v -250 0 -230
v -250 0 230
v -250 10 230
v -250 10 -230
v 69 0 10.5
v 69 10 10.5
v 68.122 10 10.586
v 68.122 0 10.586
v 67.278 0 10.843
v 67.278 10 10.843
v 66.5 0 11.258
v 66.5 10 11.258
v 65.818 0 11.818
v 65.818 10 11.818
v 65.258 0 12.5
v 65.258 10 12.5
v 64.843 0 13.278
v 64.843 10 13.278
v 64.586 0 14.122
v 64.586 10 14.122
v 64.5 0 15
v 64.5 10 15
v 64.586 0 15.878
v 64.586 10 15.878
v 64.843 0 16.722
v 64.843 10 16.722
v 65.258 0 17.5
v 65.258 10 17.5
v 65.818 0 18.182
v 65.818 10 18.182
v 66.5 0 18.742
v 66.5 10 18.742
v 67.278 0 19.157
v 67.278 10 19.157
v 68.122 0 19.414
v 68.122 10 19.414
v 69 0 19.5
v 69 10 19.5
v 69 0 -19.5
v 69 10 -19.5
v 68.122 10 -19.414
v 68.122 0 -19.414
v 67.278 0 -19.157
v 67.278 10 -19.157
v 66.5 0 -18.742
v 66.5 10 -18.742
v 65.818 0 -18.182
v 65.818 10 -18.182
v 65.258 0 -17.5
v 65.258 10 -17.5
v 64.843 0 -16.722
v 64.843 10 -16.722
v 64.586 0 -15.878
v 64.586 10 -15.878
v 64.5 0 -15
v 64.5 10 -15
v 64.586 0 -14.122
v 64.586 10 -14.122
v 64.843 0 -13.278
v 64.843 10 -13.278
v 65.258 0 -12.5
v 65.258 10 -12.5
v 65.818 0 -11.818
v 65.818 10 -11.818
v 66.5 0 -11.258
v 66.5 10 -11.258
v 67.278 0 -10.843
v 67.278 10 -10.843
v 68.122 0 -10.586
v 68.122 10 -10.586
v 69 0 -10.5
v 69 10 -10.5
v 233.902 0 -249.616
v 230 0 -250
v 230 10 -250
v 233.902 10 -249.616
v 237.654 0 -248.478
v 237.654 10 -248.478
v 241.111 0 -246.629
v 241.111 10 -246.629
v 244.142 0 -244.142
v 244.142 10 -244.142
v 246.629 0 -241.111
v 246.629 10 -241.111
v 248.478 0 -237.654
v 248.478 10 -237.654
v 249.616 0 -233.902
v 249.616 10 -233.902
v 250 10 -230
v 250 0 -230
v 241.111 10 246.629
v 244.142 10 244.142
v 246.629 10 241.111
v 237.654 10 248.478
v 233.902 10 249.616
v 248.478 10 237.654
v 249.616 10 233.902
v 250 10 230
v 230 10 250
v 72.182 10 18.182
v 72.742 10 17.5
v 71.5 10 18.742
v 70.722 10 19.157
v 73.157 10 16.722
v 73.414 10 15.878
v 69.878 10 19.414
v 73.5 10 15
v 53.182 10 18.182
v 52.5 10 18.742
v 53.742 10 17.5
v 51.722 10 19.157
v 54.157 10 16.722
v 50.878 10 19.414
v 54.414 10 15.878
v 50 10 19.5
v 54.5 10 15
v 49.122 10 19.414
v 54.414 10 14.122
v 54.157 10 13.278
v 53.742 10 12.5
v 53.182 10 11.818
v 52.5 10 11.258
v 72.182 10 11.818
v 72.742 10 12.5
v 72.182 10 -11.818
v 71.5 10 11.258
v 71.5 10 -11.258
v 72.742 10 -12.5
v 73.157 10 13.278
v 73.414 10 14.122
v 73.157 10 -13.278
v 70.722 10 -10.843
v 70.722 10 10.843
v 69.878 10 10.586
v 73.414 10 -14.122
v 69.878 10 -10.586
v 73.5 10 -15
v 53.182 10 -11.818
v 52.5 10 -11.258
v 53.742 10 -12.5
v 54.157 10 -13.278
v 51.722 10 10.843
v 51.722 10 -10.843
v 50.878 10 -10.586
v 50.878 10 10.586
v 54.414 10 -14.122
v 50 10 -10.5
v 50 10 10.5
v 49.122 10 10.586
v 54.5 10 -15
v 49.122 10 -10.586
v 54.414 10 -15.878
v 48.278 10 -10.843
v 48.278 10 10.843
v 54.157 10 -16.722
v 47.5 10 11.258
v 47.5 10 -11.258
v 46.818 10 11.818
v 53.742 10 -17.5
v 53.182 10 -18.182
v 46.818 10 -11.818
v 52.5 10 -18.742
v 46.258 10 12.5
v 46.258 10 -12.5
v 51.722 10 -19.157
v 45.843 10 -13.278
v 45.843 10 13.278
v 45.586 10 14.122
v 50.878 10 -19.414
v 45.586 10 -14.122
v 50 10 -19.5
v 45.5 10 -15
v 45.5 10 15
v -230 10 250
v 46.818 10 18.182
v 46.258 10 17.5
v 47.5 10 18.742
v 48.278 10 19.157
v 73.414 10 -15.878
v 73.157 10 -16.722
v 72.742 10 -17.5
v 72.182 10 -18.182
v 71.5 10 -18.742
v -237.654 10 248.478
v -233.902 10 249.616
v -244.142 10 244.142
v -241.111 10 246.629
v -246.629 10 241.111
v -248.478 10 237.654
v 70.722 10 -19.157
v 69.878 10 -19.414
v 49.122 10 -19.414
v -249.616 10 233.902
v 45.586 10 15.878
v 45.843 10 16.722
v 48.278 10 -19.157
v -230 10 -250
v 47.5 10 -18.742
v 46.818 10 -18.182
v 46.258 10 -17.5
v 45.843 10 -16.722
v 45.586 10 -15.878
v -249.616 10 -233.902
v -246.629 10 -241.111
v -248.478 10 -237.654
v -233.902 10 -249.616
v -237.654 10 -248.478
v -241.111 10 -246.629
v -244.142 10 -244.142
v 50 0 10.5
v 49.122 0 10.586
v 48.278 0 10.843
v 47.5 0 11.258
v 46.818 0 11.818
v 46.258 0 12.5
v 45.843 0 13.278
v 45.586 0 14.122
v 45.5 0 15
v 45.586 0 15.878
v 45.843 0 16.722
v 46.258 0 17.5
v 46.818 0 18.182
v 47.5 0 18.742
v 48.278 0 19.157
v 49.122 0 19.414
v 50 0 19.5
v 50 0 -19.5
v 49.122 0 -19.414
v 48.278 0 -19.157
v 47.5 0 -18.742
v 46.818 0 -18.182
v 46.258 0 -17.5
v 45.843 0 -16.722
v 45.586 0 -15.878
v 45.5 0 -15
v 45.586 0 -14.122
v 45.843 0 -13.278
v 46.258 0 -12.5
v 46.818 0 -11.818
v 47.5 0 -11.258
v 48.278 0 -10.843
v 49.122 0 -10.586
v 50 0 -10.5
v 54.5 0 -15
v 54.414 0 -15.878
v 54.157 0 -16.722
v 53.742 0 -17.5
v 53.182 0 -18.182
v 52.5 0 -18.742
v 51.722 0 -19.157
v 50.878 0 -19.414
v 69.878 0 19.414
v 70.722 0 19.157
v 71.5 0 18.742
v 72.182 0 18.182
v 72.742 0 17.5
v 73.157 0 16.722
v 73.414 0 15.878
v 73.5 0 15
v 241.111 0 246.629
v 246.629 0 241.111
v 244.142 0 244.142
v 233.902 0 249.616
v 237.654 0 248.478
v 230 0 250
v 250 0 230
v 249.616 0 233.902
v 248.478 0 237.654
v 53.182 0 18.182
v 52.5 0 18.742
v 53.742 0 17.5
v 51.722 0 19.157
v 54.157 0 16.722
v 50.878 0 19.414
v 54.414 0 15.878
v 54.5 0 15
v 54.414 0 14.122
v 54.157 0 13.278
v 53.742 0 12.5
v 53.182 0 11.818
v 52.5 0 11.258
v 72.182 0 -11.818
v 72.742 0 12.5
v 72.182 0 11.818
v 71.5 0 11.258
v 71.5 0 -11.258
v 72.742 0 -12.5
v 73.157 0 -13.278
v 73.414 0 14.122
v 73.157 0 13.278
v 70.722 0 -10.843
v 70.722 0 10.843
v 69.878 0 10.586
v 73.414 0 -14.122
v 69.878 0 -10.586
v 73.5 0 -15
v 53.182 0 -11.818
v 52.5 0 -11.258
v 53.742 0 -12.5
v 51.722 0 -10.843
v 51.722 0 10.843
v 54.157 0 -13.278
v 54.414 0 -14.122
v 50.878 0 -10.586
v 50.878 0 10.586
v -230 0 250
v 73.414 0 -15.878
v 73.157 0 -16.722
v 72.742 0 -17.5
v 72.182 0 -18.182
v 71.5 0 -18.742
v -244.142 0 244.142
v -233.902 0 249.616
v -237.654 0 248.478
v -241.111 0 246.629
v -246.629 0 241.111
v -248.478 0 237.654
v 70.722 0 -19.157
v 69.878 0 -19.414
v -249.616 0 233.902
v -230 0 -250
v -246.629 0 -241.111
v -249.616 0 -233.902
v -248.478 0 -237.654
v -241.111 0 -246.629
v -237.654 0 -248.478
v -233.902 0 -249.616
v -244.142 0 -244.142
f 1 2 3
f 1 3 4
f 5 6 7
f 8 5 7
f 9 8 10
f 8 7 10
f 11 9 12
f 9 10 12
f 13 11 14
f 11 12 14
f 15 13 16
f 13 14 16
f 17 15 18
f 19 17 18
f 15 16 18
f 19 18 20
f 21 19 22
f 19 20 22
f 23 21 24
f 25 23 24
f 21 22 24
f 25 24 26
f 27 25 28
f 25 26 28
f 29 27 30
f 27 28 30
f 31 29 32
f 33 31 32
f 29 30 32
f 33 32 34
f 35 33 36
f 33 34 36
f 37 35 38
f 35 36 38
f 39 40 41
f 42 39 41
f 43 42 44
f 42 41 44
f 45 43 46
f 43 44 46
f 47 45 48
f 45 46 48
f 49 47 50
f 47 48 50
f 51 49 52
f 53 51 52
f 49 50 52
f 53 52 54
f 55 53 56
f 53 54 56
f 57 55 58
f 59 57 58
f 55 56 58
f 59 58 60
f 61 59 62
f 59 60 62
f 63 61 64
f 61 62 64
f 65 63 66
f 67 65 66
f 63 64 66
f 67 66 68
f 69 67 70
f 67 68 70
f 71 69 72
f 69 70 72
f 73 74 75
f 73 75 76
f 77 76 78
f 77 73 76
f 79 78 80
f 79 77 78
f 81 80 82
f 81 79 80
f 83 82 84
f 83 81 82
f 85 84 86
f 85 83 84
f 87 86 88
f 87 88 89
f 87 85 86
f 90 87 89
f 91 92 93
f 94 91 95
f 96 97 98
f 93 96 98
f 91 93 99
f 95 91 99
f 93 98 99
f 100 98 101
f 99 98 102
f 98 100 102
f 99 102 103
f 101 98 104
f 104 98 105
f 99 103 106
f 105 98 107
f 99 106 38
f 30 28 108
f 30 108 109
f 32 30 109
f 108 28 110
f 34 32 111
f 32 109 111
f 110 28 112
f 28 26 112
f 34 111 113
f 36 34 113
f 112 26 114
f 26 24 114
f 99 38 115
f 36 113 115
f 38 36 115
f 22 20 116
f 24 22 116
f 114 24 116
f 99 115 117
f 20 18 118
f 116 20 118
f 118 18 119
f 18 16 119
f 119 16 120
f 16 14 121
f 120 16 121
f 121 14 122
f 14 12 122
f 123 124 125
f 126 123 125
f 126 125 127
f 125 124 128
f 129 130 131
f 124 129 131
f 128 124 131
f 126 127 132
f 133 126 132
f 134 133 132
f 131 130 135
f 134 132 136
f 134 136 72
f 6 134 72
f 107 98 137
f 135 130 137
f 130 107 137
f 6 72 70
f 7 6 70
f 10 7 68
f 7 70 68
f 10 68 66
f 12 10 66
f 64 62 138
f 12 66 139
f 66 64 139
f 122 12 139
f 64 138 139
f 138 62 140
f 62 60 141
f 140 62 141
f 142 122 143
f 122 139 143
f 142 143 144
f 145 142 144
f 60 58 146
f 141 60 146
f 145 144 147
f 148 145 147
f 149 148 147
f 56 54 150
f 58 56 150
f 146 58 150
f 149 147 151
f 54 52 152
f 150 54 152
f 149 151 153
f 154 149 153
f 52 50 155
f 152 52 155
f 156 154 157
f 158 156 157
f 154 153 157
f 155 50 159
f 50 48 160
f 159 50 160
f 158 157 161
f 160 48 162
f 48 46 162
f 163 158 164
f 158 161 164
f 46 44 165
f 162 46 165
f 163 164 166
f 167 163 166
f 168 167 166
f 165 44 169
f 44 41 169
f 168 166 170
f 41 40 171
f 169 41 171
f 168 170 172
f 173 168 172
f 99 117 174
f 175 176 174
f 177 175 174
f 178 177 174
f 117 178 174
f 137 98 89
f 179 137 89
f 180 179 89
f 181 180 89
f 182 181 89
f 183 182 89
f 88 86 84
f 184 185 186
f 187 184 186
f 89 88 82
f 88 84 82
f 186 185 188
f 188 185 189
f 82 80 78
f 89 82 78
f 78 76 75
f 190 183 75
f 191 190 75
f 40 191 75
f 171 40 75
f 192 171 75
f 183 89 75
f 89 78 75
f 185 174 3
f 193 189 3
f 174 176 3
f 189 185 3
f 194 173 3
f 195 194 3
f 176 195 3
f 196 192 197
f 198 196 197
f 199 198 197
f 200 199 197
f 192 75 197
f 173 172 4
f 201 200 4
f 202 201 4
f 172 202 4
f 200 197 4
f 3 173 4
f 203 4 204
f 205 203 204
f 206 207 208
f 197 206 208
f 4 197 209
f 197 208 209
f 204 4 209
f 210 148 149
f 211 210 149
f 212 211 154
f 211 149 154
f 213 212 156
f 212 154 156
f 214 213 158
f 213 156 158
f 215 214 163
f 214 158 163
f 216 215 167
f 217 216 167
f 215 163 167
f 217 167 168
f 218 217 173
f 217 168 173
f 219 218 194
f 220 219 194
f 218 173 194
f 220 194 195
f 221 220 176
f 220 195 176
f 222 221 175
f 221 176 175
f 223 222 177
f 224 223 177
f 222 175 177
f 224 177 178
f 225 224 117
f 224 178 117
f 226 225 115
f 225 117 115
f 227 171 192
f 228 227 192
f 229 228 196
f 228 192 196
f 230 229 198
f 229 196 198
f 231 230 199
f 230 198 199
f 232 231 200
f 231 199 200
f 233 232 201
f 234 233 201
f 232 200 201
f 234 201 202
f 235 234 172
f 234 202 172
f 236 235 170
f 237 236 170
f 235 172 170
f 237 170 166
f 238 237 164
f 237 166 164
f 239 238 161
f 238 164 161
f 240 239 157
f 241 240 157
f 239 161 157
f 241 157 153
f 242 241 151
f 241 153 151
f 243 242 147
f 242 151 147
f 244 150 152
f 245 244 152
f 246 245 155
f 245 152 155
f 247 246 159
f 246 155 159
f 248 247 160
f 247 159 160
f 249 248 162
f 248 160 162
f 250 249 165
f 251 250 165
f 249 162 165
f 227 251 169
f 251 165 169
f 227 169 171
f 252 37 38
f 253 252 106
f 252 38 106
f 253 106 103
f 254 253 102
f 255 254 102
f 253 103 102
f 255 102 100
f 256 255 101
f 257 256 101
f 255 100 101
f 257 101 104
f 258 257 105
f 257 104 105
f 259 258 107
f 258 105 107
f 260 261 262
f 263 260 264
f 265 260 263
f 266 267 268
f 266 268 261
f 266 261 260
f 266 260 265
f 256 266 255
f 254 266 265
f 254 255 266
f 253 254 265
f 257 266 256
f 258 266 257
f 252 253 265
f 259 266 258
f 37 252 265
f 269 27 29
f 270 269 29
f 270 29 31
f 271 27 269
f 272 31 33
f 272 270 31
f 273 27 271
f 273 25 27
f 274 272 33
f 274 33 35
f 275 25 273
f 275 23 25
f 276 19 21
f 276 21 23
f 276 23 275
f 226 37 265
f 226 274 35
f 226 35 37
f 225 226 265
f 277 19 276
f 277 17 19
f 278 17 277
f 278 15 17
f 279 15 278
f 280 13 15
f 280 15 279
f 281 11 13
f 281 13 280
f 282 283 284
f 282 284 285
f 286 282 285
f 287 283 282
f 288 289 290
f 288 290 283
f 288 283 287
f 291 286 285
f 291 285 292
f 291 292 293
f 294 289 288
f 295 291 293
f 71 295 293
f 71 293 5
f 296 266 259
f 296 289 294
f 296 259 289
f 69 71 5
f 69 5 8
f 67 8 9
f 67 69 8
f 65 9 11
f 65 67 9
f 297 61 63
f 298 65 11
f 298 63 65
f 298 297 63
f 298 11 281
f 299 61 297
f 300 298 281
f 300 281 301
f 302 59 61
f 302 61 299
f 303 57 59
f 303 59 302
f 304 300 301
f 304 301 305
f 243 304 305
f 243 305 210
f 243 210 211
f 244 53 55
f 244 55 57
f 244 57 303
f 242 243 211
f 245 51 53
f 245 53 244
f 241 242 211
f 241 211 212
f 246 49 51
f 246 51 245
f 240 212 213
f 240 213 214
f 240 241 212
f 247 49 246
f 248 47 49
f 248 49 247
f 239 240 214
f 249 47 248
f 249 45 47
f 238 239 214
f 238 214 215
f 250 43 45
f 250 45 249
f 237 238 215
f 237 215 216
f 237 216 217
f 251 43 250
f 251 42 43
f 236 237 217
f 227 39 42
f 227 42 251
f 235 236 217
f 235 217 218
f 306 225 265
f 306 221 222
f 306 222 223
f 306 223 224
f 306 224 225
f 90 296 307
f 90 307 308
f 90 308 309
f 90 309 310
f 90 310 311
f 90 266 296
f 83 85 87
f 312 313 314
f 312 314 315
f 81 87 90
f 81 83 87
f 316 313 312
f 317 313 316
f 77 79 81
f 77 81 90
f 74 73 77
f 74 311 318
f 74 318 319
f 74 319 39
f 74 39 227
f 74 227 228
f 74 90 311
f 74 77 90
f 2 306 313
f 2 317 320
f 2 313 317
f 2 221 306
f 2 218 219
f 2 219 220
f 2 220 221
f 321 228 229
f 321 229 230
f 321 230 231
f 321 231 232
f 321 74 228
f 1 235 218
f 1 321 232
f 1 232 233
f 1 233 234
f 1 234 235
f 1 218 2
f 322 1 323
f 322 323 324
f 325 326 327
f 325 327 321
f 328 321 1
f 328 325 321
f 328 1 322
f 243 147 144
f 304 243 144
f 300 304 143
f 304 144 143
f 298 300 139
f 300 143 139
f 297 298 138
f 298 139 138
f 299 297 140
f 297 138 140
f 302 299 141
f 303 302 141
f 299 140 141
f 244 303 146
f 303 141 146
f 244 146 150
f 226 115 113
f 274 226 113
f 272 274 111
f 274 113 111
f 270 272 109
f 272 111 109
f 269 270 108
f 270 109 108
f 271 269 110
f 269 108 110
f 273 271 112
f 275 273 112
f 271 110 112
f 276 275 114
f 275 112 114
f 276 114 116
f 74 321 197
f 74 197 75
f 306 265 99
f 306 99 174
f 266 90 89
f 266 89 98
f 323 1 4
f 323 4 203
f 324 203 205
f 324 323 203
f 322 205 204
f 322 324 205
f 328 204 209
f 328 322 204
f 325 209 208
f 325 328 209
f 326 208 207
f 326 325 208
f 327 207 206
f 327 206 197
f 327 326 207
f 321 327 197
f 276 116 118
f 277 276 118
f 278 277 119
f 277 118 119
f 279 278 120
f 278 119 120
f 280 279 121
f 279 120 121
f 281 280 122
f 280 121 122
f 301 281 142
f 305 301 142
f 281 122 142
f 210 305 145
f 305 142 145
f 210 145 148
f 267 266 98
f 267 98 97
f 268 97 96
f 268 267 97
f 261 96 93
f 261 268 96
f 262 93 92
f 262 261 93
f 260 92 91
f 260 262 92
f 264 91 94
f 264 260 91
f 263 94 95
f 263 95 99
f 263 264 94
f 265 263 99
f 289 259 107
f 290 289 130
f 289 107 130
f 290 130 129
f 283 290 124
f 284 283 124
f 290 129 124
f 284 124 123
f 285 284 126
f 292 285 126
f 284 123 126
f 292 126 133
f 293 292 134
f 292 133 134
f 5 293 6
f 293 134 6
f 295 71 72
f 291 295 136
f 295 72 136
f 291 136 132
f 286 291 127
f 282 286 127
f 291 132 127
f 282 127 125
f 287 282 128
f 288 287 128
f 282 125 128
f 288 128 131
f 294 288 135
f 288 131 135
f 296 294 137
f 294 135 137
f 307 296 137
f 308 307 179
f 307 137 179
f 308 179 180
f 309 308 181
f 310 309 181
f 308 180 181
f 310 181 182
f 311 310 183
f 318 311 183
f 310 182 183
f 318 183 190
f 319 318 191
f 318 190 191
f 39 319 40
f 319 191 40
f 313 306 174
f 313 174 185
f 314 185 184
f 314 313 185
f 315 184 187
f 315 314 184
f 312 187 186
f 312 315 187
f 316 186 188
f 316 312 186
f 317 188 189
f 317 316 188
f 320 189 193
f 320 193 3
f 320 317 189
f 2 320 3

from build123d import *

# Parameters (mm, degrees)
SALIENTE_EXTRUIR1_DEPTH = 10
CORTAR_EXTRUIR2_DEPTH   = 354.694783677


with BuildPart() as part:
    # Croquis1 → Saliente-Extruir1 (new body)
    with BuildSketch(Plane(origin=(0, 0, 0), x_dir=(1, 0, 0), z_dir=(0, 1, 0))):
        with BuildLine():
            Line((-230, 250), (230, 250))
            ThreePointArc((230, 250), (244.142135624, 244.142135624), (250, 230))
            Line((250, 230), (250, -230))
            ThreePointArc((250, -230), (244.142135624, -244.142135624), (230, -250))
            Line((230, -250), (-230, -250))
            ThreePointArc((-230, -250), (-244.142135624, -244.142135624), (-250, -230))
            Line((-250, -230), (-250, 230))
            ThreePointArc((-250, 230), (-244.142135624, 244.142135624), (-230, 250))
        make_face()
    extrude(amount=SALIENTE_EXTRUIR1_DEPTH)

    # Croquis4 → Cortar-Extruir2 (cut, through all)
    with BuildSketch(Plane(origin=(0, 10, 0), x_dir=(1, 0, 0), z_dir=(0, 1, 0))):
        with BuildLine():
            ThreePointArc((73.5, -15), (72.181980515, -11.818019485), (69, -10.5))
            ThreePointArc((69, -10.5), (64.5, -15), (69, -19.5))
            ThreePointArc((69, -19.5), (72.181980515, -18.181980515), (73.5, -15))
        make_face()
        with BuildLine():
            ThreePointArc((54.5, -15), (53.181980515, -11.818019485), (50, -10.5))
            ThreePointArc((50, -10.5), (45.5, -15), (50, -19.5))
            ThreePointArc((50, -19.5), (53.181980515, -18.181980515), (54.5, -15))
        make_face()
        with BuildLine():
            ThreePointArc((54.5, 15), (53.181980515, 18.181980515), (50, 19.5))
            ThreePointArc((50, 19.5), (45.5, 15), (50, 10.5))
            ThreePointArc((50, 10.5), (53.181980515, 11.818019485), (54.5, 15))
        make_face()
        with BuildLine():
            ThreePointArc((73.5, 15), (72.181980515, 18.181980515), (69, 19.5))
            ThreePointArc((69, 19.5), (64.5, 15), (69, 10.5))
            ThreePointArc((69, 10.5), (72.181980515, 11.818019485), (73.5, 15))
        make_face()
    extrude(amount=-CORTAR_EXTRUIR2_DEPTH, mode=Mode.SUBTRACT)


solid = part.part
